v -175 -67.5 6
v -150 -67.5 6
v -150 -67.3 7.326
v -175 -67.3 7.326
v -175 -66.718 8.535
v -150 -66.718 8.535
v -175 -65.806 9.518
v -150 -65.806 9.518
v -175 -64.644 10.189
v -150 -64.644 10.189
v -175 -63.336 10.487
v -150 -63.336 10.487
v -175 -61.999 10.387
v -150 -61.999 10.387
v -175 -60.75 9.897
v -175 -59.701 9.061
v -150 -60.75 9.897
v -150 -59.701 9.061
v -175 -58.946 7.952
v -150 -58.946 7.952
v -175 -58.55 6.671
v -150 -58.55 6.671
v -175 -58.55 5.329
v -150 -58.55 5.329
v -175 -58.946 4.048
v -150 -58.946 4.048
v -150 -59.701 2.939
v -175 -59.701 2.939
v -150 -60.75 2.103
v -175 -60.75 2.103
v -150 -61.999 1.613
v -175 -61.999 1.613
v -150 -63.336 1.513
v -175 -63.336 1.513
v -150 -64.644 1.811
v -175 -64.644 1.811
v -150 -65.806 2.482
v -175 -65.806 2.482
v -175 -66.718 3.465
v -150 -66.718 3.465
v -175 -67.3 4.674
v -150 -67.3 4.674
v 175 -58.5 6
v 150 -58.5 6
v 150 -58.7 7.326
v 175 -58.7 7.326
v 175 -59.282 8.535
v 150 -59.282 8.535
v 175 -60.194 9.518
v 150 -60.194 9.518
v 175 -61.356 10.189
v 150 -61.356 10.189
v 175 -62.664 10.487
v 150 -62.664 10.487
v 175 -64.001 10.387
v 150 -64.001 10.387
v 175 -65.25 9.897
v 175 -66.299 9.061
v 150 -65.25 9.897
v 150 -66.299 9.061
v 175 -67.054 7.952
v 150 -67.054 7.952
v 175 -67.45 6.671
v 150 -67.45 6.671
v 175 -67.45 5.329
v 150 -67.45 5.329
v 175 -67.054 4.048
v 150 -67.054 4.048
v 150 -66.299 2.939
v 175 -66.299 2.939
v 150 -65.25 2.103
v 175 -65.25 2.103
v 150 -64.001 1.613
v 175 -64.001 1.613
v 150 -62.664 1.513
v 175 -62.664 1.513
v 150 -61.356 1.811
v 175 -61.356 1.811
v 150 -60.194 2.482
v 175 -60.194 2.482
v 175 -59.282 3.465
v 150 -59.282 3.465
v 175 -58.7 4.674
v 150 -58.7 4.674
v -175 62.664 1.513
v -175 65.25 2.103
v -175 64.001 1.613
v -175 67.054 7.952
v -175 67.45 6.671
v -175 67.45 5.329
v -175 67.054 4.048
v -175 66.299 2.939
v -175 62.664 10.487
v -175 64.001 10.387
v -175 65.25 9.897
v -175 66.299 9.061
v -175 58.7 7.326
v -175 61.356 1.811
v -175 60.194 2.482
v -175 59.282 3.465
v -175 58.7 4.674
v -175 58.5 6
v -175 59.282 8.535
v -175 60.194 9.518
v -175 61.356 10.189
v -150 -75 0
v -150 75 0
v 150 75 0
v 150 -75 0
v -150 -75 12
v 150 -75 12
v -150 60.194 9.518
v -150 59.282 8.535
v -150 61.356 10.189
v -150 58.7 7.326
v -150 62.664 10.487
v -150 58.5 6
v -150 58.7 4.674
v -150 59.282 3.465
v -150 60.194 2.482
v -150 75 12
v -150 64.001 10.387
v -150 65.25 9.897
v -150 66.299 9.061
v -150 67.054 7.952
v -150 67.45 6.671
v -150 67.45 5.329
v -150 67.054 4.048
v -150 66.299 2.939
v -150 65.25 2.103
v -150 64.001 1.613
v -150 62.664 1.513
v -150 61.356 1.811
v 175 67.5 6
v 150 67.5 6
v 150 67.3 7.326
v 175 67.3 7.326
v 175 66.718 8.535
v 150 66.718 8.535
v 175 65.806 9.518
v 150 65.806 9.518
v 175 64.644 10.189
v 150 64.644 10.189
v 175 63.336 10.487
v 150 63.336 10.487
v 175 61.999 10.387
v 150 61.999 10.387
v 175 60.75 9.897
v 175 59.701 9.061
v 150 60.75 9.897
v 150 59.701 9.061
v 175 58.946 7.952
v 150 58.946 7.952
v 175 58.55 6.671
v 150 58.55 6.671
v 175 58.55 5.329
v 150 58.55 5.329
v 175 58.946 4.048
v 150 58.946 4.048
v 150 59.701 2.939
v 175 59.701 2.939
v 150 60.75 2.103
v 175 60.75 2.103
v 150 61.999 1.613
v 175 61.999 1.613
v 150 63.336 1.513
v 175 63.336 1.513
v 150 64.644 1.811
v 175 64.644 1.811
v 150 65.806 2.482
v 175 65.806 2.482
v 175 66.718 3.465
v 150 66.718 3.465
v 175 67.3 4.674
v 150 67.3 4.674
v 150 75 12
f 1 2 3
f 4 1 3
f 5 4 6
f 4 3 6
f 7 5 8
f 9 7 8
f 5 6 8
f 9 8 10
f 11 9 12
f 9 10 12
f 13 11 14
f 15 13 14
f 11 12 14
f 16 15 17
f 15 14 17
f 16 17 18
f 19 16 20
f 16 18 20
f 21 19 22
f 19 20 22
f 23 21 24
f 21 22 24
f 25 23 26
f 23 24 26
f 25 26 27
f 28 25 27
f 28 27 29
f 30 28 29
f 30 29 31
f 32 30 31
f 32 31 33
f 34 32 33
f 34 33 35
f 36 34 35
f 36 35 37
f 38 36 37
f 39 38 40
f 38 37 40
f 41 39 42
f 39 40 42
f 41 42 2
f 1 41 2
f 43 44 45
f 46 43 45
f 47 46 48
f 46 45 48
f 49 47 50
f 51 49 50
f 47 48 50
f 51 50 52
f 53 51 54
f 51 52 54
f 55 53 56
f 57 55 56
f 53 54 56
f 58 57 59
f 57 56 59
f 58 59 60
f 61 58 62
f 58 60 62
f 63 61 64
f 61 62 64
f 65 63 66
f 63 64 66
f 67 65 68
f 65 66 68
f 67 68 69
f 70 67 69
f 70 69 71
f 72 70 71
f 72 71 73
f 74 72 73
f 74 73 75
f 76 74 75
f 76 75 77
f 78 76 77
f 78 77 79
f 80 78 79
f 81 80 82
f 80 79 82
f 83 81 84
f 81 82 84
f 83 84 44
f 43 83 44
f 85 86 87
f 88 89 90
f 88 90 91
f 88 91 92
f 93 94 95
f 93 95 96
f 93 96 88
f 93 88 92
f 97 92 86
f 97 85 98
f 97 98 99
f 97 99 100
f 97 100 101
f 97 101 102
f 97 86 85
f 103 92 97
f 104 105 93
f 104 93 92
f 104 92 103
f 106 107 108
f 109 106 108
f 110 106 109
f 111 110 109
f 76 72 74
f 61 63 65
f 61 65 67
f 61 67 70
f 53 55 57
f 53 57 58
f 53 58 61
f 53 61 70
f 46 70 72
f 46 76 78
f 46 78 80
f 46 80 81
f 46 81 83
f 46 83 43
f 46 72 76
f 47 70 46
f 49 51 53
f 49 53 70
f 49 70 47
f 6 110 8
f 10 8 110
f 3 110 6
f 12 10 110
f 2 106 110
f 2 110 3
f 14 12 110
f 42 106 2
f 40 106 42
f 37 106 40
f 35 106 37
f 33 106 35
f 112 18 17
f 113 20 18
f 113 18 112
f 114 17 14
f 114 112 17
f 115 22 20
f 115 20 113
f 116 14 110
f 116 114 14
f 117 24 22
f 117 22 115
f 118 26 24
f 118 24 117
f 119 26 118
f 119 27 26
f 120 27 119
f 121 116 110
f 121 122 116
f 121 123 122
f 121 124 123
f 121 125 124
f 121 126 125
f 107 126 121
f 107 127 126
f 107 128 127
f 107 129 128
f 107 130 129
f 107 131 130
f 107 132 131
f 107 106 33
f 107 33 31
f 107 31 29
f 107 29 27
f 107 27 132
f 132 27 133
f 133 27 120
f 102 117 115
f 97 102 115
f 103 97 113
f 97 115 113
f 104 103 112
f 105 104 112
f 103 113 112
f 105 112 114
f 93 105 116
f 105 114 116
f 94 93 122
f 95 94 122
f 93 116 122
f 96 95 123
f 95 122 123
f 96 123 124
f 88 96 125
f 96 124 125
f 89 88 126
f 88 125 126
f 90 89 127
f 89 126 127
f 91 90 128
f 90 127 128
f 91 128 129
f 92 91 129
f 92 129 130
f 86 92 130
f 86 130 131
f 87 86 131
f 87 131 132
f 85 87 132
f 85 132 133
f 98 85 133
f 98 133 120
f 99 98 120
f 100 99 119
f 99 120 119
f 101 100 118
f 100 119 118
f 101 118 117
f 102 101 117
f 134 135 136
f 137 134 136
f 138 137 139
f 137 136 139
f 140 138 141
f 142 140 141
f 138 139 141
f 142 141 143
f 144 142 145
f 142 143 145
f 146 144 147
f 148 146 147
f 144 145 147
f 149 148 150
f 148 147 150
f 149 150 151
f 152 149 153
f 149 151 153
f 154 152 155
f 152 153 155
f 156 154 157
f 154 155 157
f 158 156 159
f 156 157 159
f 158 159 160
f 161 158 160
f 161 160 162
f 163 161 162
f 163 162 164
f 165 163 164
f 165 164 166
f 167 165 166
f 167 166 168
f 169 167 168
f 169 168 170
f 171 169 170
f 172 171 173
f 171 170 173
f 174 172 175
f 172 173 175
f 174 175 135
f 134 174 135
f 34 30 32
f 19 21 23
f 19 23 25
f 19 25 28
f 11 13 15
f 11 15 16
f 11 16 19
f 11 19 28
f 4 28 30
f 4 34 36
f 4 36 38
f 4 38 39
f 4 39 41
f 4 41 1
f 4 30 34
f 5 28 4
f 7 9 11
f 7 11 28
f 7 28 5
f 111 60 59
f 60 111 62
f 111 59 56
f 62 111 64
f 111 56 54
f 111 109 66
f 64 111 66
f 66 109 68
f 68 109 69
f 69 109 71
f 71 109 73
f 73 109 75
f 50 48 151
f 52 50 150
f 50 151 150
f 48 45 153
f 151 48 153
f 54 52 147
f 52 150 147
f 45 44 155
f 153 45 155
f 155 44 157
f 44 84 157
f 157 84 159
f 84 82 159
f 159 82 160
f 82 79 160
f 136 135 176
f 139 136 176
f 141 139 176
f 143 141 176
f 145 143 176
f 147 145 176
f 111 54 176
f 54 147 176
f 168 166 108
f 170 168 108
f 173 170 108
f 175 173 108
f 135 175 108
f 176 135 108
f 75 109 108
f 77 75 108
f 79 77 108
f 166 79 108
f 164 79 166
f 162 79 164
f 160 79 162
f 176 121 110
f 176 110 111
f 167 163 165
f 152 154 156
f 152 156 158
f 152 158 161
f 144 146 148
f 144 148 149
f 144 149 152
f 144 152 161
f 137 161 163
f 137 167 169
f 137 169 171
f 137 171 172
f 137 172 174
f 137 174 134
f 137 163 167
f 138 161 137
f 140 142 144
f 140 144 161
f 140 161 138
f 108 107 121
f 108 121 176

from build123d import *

# Parameters (mm, degrees)
F0_W     = 300
F0_H     = 150
F1_DEPTH = 12
F2_R     = 4.5
F3_DEPTH = 25
F4_R     = 4.5
F5_DEPTH = 25


with BuildPart() as f1:
    # F0 (on Top) → F1 (new body)
    with BuildSketch(Plane.XY):
        Rectangle(F0_W, F0_H)
    extrude(amount=F1_DEPTH)

    # F2 (on face) → F3 (join)
    with BuildSketch(Plane.YZ.offset(150)):
        with Locations((-63, 6)):
            Circle(F2_R)
        with Locations((63, 6)):
            Circle(F2_R)
    extrude(amount=F3_DEPTH)

    # F4 (on face) → F5 (join)
    with BuildSketch(Plane(origin=(-150, 0, 0), x_dir=(0, -1, 0), z_dir=(-1, 0, 0))):
        with Locations((-63, 6)):
            Circle(F4_R)
        with Locations((63, 6)):
            Circle(F4_R)
    extrude(amount=F5_DEPTH)


solid = f1.part
